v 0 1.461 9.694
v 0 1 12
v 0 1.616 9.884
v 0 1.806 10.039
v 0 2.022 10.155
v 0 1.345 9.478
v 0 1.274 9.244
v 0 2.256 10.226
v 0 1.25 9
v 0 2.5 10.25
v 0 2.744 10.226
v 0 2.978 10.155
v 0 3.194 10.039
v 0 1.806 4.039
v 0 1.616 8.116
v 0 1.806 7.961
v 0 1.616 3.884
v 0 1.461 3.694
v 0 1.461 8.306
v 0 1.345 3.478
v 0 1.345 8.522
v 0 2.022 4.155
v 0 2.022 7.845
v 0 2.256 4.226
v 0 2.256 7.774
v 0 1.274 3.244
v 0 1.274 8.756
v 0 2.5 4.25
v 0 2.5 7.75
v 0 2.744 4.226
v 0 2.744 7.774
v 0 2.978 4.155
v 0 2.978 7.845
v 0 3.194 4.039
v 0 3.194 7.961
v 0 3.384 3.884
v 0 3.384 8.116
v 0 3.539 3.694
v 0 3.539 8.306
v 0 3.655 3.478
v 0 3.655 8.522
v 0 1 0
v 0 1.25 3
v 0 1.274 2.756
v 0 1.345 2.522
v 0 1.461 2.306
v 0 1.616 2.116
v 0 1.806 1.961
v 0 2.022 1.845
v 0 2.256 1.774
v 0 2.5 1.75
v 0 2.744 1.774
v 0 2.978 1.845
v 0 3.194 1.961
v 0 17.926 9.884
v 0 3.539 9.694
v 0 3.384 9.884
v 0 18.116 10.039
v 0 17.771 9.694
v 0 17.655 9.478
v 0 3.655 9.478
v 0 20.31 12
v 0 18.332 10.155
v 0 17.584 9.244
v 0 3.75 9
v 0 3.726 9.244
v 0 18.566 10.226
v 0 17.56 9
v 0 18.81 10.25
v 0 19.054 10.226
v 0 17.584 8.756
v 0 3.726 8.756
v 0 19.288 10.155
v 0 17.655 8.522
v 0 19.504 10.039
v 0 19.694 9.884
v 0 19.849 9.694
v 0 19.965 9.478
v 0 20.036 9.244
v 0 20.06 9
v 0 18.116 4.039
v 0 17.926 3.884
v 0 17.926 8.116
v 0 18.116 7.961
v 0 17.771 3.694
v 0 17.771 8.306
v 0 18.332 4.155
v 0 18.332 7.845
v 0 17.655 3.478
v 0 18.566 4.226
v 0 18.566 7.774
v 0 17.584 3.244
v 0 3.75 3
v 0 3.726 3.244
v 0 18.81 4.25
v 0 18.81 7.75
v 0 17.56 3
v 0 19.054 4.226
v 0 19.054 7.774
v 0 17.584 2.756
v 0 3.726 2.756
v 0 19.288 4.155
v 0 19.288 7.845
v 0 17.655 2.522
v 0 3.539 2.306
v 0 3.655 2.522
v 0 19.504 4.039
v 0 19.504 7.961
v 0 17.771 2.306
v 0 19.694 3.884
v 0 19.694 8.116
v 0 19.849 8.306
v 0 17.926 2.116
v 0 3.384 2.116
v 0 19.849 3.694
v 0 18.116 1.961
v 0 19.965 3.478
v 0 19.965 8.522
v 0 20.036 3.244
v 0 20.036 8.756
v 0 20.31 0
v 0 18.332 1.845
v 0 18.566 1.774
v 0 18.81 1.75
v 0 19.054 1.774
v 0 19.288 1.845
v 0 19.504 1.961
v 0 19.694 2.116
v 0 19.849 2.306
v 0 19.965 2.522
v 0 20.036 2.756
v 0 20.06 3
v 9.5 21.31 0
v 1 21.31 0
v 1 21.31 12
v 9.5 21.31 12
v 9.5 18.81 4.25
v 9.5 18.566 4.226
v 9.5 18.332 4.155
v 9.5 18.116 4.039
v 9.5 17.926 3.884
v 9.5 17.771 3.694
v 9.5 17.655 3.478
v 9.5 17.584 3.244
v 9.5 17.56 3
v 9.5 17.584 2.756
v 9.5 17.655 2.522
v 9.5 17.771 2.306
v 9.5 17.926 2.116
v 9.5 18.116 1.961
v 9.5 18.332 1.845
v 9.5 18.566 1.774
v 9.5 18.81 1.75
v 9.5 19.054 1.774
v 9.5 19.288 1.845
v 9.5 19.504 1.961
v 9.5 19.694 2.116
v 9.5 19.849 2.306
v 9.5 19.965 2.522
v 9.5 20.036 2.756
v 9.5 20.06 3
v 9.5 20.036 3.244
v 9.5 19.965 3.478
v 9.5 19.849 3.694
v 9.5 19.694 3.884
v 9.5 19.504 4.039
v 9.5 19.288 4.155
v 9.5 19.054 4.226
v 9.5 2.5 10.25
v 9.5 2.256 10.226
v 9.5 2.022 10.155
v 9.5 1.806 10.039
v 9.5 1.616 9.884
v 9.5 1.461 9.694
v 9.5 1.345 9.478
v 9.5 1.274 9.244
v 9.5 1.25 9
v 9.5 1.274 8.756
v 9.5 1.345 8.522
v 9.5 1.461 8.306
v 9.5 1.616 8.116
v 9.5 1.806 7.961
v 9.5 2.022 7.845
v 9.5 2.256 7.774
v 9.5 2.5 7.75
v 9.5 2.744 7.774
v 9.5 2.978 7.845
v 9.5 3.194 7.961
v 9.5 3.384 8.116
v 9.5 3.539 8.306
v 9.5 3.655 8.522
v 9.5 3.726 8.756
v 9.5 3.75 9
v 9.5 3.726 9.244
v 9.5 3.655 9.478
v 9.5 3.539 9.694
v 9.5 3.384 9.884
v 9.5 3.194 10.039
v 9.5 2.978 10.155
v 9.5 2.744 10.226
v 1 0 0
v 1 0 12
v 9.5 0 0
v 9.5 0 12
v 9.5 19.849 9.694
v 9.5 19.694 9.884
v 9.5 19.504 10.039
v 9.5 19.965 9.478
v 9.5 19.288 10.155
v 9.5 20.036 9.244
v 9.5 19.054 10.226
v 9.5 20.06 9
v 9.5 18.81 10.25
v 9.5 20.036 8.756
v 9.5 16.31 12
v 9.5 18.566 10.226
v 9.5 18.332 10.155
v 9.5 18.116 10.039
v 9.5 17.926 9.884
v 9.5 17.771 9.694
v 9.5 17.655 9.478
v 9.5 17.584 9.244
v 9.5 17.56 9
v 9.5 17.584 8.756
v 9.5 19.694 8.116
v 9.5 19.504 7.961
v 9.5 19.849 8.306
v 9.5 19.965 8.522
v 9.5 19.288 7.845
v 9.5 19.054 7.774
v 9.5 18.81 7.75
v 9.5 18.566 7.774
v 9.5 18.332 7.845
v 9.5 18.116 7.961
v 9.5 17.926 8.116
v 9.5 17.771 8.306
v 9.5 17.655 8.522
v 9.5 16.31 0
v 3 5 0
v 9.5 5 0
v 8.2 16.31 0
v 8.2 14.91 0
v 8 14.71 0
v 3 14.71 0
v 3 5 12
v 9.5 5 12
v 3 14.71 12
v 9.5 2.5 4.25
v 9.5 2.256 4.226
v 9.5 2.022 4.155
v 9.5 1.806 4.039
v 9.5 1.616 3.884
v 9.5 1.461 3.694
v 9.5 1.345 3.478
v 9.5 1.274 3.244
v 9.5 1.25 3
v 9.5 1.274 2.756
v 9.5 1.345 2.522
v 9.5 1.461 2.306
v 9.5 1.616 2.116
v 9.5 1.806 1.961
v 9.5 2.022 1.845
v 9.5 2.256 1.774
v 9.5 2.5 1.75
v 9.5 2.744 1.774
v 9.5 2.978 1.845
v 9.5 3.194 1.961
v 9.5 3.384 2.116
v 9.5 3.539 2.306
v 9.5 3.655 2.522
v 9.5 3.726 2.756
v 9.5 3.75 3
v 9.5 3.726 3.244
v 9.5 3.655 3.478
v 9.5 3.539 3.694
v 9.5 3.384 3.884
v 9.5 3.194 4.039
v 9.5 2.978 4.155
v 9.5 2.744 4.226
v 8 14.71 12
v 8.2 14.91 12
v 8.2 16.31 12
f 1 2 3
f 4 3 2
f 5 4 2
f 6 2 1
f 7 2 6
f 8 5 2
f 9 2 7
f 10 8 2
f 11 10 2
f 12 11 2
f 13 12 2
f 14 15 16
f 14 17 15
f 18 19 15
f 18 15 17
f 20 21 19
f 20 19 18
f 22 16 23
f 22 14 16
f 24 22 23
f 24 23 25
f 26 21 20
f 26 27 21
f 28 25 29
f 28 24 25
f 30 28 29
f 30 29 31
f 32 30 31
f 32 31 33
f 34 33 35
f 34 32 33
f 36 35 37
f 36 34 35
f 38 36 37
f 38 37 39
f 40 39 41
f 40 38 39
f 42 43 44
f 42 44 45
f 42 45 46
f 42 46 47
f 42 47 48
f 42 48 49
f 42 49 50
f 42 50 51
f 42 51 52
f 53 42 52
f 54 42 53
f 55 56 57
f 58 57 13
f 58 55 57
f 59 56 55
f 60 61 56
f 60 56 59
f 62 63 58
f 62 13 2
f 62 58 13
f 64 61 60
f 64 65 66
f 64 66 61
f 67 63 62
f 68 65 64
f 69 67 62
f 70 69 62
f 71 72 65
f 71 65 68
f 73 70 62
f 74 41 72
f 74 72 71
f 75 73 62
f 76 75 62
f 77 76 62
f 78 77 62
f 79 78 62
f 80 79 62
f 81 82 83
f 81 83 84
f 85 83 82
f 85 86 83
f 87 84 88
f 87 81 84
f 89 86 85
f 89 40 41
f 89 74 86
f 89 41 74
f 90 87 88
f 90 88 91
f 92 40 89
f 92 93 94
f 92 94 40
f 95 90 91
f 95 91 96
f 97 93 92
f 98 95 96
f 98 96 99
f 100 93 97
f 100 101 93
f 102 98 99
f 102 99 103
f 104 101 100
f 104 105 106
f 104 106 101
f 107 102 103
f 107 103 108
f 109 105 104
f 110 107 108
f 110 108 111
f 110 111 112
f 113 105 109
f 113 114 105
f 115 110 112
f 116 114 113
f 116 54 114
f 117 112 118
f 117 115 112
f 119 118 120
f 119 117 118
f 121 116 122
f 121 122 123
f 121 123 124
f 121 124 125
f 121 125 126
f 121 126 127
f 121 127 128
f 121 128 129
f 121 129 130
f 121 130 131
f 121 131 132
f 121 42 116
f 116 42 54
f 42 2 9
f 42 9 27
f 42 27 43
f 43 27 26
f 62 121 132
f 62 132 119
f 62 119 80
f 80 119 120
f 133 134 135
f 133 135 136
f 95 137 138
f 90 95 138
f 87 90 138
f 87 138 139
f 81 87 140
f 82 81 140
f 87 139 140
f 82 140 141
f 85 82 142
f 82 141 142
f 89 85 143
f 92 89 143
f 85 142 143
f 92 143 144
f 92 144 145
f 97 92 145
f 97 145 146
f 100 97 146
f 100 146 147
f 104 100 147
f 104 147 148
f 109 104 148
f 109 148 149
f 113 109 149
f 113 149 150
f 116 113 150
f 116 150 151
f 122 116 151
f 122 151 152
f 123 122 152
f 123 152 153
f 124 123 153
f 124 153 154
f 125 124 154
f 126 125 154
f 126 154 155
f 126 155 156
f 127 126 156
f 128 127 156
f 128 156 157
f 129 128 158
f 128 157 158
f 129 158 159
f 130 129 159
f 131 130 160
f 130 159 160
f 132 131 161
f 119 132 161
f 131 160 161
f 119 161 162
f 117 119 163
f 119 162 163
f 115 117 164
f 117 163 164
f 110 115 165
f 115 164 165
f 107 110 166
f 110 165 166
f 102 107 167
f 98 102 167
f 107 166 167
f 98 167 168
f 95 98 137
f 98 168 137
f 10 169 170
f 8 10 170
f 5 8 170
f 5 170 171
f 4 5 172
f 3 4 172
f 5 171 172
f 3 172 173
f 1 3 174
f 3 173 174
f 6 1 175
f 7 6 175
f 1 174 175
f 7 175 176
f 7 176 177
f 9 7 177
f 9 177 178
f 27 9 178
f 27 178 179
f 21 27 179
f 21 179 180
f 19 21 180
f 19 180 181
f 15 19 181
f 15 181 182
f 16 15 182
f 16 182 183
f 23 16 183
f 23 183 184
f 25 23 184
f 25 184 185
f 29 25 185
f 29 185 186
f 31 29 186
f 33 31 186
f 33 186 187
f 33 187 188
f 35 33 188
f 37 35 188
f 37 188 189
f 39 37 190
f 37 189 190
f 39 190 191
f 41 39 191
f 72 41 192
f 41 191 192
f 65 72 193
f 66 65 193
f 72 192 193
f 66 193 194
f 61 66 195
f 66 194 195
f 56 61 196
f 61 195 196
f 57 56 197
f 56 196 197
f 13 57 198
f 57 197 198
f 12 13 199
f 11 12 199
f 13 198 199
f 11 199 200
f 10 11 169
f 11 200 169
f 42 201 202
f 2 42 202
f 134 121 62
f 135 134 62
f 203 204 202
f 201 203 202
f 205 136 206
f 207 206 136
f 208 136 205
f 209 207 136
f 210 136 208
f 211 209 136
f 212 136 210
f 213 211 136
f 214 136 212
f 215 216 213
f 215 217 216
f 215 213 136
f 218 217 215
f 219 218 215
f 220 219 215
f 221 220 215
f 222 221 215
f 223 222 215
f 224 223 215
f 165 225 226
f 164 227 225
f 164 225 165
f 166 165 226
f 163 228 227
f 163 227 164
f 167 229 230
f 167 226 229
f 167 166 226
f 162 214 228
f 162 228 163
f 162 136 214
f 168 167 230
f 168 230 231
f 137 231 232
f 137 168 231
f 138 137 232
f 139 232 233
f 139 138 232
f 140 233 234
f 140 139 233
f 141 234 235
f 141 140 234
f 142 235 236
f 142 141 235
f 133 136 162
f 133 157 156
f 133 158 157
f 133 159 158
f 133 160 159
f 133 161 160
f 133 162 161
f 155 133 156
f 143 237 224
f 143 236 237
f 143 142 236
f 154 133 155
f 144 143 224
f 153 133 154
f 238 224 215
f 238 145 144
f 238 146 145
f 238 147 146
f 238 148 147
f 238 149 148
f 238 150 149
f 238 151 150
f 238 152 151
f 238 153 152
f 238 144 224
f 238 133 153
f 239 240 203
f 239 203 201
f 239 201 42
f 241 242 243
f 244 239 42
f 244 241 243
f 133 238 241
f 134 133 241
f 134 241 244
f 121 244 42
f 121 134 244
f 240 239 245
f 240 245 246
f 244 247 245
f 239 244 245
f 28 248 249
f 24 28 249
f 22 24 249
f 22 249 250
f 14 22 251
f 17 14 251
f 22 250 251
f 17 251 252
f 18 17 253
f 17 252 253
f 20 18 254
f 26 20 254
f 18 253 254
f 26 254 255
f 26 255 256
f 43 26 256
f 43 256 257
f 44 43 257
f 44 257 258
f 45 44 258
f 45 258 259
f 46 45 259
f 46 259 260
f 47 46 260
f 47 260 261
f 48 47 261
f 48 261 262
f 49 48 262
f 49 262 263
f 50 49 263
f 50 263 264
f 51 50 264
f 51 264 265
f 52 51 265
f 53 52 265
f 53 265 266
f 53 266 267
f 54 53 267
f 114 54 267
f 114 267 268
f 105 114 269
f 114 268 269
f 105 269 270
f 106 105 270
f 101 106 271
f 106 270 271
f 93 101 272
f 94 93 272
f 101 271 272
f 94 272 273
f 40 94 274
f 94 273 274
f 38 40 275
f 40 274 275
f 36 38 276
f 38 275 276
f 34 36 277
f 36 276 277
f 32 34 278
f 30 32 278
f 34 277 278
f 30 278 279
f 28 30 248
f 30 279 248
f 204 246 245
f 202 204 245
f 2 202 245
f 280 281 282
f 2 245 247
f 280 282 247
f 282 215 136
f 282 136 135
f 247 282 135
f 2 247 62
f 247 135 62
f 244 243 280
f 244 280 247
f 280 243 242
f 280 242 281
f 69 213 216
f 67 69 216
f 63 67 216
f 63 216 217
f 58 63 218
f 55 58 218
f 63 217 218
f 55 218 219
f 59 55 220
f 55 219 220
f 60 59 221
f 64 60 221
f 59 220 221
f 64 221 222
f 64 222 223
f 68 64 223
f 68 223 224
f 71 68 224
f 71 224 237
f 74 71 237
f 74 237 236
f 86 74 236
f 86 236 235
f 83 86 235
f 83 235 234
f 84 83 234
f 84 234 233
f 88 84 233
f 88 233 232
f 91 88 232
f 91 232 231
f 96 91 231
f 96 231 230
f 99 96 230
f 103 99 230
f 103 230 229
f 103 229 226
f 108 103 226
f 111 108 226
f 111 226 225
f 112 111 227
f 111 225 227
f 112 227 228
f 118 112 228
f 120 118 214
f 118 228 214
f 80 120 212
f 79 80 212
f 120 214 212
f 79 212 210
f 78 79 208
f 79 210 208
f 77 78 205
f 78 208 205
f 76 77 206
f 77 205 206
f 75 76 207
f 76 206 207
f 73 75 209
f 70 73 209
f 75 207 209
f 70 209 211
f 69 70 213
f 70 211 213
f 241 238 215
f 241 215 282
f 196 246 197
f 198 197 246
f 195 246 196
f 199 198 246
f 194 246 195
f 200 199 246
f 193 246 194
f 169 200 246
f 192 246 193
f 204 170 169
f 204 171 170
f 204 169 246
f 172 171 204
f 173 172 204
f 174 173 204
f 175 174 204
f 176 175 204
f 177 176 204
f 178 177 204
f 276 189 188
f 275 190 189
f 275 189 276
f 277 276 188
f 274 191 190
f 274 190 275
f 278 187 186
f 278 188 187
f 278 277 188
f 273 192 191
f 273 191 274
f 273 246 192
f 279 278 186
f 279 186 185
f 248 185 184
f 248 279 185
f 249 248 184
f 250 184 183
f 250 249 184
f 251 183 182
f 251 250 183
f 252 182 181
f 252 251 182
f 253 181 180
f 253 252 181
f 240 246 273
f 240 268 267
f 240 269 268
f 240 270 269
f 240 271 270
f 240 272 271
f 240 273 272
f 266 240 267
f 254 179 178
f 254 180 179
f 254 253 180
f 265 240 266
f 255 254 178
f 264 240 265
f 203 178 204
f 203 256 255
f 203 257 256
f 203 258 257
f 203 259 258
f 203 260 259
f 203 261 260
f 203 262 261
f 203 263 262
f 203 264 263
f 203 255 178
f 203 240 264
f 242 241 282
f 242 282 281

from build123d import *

# Parameters (mm, degrees)
EXTRUDE_1_DEPTH    = 12
CHAMFER_1_SIZE     = 0.2
HOLE_WIZARD_M3_2_D = 2.5
CHAMFER_2_SIZE     = 1


with BuildPart() as part:
    # 草图1 → 凸台-拉伸1 (new body)
    with BuildSketch(Plane.XY):
        Polygon((0, 0), (0, 21.31), (9.5, 21.31), (9.5, 16.31), (8.2, 16.31), (8.2, 14.71), (3, 14.71), (3, 5), (9.5, 5), (9.5, 0), align=None)
    extrude(amount=EXTRUDE_1_DEPTH)

    # 倒角1
    chamfer_1_edges = [part.edges().sort_by_distance(p)[0] for p in [
        (8.2, 14.71, 6),
    ]]
    chamfer(chamfer_1_edges, length=CHAMFER_1_SIZE)

    # M3 螺纹孔2 (through all)
    with Locations(Plane(origin=(0, 2.5, 3), x_dir=(0, 0, -1), z_dir=(-1, 0, 0))):
        with Locations((0, 0), (-6, 0), (-6, -16.31), (0, -16.31)):
            Hole(HOLE_WIZARD_M3_2_D / 2)

    # 倒角2
    chamfer_2_edges = [part.edges().sort_by_distance(p)[0] for p in [
        (0, 0, 6),
        (0, 21.31, 6),
    ]]
    chamfer(chamfer_2_edges, length=CHAMFER_2_SIZE)


solid = part.part
